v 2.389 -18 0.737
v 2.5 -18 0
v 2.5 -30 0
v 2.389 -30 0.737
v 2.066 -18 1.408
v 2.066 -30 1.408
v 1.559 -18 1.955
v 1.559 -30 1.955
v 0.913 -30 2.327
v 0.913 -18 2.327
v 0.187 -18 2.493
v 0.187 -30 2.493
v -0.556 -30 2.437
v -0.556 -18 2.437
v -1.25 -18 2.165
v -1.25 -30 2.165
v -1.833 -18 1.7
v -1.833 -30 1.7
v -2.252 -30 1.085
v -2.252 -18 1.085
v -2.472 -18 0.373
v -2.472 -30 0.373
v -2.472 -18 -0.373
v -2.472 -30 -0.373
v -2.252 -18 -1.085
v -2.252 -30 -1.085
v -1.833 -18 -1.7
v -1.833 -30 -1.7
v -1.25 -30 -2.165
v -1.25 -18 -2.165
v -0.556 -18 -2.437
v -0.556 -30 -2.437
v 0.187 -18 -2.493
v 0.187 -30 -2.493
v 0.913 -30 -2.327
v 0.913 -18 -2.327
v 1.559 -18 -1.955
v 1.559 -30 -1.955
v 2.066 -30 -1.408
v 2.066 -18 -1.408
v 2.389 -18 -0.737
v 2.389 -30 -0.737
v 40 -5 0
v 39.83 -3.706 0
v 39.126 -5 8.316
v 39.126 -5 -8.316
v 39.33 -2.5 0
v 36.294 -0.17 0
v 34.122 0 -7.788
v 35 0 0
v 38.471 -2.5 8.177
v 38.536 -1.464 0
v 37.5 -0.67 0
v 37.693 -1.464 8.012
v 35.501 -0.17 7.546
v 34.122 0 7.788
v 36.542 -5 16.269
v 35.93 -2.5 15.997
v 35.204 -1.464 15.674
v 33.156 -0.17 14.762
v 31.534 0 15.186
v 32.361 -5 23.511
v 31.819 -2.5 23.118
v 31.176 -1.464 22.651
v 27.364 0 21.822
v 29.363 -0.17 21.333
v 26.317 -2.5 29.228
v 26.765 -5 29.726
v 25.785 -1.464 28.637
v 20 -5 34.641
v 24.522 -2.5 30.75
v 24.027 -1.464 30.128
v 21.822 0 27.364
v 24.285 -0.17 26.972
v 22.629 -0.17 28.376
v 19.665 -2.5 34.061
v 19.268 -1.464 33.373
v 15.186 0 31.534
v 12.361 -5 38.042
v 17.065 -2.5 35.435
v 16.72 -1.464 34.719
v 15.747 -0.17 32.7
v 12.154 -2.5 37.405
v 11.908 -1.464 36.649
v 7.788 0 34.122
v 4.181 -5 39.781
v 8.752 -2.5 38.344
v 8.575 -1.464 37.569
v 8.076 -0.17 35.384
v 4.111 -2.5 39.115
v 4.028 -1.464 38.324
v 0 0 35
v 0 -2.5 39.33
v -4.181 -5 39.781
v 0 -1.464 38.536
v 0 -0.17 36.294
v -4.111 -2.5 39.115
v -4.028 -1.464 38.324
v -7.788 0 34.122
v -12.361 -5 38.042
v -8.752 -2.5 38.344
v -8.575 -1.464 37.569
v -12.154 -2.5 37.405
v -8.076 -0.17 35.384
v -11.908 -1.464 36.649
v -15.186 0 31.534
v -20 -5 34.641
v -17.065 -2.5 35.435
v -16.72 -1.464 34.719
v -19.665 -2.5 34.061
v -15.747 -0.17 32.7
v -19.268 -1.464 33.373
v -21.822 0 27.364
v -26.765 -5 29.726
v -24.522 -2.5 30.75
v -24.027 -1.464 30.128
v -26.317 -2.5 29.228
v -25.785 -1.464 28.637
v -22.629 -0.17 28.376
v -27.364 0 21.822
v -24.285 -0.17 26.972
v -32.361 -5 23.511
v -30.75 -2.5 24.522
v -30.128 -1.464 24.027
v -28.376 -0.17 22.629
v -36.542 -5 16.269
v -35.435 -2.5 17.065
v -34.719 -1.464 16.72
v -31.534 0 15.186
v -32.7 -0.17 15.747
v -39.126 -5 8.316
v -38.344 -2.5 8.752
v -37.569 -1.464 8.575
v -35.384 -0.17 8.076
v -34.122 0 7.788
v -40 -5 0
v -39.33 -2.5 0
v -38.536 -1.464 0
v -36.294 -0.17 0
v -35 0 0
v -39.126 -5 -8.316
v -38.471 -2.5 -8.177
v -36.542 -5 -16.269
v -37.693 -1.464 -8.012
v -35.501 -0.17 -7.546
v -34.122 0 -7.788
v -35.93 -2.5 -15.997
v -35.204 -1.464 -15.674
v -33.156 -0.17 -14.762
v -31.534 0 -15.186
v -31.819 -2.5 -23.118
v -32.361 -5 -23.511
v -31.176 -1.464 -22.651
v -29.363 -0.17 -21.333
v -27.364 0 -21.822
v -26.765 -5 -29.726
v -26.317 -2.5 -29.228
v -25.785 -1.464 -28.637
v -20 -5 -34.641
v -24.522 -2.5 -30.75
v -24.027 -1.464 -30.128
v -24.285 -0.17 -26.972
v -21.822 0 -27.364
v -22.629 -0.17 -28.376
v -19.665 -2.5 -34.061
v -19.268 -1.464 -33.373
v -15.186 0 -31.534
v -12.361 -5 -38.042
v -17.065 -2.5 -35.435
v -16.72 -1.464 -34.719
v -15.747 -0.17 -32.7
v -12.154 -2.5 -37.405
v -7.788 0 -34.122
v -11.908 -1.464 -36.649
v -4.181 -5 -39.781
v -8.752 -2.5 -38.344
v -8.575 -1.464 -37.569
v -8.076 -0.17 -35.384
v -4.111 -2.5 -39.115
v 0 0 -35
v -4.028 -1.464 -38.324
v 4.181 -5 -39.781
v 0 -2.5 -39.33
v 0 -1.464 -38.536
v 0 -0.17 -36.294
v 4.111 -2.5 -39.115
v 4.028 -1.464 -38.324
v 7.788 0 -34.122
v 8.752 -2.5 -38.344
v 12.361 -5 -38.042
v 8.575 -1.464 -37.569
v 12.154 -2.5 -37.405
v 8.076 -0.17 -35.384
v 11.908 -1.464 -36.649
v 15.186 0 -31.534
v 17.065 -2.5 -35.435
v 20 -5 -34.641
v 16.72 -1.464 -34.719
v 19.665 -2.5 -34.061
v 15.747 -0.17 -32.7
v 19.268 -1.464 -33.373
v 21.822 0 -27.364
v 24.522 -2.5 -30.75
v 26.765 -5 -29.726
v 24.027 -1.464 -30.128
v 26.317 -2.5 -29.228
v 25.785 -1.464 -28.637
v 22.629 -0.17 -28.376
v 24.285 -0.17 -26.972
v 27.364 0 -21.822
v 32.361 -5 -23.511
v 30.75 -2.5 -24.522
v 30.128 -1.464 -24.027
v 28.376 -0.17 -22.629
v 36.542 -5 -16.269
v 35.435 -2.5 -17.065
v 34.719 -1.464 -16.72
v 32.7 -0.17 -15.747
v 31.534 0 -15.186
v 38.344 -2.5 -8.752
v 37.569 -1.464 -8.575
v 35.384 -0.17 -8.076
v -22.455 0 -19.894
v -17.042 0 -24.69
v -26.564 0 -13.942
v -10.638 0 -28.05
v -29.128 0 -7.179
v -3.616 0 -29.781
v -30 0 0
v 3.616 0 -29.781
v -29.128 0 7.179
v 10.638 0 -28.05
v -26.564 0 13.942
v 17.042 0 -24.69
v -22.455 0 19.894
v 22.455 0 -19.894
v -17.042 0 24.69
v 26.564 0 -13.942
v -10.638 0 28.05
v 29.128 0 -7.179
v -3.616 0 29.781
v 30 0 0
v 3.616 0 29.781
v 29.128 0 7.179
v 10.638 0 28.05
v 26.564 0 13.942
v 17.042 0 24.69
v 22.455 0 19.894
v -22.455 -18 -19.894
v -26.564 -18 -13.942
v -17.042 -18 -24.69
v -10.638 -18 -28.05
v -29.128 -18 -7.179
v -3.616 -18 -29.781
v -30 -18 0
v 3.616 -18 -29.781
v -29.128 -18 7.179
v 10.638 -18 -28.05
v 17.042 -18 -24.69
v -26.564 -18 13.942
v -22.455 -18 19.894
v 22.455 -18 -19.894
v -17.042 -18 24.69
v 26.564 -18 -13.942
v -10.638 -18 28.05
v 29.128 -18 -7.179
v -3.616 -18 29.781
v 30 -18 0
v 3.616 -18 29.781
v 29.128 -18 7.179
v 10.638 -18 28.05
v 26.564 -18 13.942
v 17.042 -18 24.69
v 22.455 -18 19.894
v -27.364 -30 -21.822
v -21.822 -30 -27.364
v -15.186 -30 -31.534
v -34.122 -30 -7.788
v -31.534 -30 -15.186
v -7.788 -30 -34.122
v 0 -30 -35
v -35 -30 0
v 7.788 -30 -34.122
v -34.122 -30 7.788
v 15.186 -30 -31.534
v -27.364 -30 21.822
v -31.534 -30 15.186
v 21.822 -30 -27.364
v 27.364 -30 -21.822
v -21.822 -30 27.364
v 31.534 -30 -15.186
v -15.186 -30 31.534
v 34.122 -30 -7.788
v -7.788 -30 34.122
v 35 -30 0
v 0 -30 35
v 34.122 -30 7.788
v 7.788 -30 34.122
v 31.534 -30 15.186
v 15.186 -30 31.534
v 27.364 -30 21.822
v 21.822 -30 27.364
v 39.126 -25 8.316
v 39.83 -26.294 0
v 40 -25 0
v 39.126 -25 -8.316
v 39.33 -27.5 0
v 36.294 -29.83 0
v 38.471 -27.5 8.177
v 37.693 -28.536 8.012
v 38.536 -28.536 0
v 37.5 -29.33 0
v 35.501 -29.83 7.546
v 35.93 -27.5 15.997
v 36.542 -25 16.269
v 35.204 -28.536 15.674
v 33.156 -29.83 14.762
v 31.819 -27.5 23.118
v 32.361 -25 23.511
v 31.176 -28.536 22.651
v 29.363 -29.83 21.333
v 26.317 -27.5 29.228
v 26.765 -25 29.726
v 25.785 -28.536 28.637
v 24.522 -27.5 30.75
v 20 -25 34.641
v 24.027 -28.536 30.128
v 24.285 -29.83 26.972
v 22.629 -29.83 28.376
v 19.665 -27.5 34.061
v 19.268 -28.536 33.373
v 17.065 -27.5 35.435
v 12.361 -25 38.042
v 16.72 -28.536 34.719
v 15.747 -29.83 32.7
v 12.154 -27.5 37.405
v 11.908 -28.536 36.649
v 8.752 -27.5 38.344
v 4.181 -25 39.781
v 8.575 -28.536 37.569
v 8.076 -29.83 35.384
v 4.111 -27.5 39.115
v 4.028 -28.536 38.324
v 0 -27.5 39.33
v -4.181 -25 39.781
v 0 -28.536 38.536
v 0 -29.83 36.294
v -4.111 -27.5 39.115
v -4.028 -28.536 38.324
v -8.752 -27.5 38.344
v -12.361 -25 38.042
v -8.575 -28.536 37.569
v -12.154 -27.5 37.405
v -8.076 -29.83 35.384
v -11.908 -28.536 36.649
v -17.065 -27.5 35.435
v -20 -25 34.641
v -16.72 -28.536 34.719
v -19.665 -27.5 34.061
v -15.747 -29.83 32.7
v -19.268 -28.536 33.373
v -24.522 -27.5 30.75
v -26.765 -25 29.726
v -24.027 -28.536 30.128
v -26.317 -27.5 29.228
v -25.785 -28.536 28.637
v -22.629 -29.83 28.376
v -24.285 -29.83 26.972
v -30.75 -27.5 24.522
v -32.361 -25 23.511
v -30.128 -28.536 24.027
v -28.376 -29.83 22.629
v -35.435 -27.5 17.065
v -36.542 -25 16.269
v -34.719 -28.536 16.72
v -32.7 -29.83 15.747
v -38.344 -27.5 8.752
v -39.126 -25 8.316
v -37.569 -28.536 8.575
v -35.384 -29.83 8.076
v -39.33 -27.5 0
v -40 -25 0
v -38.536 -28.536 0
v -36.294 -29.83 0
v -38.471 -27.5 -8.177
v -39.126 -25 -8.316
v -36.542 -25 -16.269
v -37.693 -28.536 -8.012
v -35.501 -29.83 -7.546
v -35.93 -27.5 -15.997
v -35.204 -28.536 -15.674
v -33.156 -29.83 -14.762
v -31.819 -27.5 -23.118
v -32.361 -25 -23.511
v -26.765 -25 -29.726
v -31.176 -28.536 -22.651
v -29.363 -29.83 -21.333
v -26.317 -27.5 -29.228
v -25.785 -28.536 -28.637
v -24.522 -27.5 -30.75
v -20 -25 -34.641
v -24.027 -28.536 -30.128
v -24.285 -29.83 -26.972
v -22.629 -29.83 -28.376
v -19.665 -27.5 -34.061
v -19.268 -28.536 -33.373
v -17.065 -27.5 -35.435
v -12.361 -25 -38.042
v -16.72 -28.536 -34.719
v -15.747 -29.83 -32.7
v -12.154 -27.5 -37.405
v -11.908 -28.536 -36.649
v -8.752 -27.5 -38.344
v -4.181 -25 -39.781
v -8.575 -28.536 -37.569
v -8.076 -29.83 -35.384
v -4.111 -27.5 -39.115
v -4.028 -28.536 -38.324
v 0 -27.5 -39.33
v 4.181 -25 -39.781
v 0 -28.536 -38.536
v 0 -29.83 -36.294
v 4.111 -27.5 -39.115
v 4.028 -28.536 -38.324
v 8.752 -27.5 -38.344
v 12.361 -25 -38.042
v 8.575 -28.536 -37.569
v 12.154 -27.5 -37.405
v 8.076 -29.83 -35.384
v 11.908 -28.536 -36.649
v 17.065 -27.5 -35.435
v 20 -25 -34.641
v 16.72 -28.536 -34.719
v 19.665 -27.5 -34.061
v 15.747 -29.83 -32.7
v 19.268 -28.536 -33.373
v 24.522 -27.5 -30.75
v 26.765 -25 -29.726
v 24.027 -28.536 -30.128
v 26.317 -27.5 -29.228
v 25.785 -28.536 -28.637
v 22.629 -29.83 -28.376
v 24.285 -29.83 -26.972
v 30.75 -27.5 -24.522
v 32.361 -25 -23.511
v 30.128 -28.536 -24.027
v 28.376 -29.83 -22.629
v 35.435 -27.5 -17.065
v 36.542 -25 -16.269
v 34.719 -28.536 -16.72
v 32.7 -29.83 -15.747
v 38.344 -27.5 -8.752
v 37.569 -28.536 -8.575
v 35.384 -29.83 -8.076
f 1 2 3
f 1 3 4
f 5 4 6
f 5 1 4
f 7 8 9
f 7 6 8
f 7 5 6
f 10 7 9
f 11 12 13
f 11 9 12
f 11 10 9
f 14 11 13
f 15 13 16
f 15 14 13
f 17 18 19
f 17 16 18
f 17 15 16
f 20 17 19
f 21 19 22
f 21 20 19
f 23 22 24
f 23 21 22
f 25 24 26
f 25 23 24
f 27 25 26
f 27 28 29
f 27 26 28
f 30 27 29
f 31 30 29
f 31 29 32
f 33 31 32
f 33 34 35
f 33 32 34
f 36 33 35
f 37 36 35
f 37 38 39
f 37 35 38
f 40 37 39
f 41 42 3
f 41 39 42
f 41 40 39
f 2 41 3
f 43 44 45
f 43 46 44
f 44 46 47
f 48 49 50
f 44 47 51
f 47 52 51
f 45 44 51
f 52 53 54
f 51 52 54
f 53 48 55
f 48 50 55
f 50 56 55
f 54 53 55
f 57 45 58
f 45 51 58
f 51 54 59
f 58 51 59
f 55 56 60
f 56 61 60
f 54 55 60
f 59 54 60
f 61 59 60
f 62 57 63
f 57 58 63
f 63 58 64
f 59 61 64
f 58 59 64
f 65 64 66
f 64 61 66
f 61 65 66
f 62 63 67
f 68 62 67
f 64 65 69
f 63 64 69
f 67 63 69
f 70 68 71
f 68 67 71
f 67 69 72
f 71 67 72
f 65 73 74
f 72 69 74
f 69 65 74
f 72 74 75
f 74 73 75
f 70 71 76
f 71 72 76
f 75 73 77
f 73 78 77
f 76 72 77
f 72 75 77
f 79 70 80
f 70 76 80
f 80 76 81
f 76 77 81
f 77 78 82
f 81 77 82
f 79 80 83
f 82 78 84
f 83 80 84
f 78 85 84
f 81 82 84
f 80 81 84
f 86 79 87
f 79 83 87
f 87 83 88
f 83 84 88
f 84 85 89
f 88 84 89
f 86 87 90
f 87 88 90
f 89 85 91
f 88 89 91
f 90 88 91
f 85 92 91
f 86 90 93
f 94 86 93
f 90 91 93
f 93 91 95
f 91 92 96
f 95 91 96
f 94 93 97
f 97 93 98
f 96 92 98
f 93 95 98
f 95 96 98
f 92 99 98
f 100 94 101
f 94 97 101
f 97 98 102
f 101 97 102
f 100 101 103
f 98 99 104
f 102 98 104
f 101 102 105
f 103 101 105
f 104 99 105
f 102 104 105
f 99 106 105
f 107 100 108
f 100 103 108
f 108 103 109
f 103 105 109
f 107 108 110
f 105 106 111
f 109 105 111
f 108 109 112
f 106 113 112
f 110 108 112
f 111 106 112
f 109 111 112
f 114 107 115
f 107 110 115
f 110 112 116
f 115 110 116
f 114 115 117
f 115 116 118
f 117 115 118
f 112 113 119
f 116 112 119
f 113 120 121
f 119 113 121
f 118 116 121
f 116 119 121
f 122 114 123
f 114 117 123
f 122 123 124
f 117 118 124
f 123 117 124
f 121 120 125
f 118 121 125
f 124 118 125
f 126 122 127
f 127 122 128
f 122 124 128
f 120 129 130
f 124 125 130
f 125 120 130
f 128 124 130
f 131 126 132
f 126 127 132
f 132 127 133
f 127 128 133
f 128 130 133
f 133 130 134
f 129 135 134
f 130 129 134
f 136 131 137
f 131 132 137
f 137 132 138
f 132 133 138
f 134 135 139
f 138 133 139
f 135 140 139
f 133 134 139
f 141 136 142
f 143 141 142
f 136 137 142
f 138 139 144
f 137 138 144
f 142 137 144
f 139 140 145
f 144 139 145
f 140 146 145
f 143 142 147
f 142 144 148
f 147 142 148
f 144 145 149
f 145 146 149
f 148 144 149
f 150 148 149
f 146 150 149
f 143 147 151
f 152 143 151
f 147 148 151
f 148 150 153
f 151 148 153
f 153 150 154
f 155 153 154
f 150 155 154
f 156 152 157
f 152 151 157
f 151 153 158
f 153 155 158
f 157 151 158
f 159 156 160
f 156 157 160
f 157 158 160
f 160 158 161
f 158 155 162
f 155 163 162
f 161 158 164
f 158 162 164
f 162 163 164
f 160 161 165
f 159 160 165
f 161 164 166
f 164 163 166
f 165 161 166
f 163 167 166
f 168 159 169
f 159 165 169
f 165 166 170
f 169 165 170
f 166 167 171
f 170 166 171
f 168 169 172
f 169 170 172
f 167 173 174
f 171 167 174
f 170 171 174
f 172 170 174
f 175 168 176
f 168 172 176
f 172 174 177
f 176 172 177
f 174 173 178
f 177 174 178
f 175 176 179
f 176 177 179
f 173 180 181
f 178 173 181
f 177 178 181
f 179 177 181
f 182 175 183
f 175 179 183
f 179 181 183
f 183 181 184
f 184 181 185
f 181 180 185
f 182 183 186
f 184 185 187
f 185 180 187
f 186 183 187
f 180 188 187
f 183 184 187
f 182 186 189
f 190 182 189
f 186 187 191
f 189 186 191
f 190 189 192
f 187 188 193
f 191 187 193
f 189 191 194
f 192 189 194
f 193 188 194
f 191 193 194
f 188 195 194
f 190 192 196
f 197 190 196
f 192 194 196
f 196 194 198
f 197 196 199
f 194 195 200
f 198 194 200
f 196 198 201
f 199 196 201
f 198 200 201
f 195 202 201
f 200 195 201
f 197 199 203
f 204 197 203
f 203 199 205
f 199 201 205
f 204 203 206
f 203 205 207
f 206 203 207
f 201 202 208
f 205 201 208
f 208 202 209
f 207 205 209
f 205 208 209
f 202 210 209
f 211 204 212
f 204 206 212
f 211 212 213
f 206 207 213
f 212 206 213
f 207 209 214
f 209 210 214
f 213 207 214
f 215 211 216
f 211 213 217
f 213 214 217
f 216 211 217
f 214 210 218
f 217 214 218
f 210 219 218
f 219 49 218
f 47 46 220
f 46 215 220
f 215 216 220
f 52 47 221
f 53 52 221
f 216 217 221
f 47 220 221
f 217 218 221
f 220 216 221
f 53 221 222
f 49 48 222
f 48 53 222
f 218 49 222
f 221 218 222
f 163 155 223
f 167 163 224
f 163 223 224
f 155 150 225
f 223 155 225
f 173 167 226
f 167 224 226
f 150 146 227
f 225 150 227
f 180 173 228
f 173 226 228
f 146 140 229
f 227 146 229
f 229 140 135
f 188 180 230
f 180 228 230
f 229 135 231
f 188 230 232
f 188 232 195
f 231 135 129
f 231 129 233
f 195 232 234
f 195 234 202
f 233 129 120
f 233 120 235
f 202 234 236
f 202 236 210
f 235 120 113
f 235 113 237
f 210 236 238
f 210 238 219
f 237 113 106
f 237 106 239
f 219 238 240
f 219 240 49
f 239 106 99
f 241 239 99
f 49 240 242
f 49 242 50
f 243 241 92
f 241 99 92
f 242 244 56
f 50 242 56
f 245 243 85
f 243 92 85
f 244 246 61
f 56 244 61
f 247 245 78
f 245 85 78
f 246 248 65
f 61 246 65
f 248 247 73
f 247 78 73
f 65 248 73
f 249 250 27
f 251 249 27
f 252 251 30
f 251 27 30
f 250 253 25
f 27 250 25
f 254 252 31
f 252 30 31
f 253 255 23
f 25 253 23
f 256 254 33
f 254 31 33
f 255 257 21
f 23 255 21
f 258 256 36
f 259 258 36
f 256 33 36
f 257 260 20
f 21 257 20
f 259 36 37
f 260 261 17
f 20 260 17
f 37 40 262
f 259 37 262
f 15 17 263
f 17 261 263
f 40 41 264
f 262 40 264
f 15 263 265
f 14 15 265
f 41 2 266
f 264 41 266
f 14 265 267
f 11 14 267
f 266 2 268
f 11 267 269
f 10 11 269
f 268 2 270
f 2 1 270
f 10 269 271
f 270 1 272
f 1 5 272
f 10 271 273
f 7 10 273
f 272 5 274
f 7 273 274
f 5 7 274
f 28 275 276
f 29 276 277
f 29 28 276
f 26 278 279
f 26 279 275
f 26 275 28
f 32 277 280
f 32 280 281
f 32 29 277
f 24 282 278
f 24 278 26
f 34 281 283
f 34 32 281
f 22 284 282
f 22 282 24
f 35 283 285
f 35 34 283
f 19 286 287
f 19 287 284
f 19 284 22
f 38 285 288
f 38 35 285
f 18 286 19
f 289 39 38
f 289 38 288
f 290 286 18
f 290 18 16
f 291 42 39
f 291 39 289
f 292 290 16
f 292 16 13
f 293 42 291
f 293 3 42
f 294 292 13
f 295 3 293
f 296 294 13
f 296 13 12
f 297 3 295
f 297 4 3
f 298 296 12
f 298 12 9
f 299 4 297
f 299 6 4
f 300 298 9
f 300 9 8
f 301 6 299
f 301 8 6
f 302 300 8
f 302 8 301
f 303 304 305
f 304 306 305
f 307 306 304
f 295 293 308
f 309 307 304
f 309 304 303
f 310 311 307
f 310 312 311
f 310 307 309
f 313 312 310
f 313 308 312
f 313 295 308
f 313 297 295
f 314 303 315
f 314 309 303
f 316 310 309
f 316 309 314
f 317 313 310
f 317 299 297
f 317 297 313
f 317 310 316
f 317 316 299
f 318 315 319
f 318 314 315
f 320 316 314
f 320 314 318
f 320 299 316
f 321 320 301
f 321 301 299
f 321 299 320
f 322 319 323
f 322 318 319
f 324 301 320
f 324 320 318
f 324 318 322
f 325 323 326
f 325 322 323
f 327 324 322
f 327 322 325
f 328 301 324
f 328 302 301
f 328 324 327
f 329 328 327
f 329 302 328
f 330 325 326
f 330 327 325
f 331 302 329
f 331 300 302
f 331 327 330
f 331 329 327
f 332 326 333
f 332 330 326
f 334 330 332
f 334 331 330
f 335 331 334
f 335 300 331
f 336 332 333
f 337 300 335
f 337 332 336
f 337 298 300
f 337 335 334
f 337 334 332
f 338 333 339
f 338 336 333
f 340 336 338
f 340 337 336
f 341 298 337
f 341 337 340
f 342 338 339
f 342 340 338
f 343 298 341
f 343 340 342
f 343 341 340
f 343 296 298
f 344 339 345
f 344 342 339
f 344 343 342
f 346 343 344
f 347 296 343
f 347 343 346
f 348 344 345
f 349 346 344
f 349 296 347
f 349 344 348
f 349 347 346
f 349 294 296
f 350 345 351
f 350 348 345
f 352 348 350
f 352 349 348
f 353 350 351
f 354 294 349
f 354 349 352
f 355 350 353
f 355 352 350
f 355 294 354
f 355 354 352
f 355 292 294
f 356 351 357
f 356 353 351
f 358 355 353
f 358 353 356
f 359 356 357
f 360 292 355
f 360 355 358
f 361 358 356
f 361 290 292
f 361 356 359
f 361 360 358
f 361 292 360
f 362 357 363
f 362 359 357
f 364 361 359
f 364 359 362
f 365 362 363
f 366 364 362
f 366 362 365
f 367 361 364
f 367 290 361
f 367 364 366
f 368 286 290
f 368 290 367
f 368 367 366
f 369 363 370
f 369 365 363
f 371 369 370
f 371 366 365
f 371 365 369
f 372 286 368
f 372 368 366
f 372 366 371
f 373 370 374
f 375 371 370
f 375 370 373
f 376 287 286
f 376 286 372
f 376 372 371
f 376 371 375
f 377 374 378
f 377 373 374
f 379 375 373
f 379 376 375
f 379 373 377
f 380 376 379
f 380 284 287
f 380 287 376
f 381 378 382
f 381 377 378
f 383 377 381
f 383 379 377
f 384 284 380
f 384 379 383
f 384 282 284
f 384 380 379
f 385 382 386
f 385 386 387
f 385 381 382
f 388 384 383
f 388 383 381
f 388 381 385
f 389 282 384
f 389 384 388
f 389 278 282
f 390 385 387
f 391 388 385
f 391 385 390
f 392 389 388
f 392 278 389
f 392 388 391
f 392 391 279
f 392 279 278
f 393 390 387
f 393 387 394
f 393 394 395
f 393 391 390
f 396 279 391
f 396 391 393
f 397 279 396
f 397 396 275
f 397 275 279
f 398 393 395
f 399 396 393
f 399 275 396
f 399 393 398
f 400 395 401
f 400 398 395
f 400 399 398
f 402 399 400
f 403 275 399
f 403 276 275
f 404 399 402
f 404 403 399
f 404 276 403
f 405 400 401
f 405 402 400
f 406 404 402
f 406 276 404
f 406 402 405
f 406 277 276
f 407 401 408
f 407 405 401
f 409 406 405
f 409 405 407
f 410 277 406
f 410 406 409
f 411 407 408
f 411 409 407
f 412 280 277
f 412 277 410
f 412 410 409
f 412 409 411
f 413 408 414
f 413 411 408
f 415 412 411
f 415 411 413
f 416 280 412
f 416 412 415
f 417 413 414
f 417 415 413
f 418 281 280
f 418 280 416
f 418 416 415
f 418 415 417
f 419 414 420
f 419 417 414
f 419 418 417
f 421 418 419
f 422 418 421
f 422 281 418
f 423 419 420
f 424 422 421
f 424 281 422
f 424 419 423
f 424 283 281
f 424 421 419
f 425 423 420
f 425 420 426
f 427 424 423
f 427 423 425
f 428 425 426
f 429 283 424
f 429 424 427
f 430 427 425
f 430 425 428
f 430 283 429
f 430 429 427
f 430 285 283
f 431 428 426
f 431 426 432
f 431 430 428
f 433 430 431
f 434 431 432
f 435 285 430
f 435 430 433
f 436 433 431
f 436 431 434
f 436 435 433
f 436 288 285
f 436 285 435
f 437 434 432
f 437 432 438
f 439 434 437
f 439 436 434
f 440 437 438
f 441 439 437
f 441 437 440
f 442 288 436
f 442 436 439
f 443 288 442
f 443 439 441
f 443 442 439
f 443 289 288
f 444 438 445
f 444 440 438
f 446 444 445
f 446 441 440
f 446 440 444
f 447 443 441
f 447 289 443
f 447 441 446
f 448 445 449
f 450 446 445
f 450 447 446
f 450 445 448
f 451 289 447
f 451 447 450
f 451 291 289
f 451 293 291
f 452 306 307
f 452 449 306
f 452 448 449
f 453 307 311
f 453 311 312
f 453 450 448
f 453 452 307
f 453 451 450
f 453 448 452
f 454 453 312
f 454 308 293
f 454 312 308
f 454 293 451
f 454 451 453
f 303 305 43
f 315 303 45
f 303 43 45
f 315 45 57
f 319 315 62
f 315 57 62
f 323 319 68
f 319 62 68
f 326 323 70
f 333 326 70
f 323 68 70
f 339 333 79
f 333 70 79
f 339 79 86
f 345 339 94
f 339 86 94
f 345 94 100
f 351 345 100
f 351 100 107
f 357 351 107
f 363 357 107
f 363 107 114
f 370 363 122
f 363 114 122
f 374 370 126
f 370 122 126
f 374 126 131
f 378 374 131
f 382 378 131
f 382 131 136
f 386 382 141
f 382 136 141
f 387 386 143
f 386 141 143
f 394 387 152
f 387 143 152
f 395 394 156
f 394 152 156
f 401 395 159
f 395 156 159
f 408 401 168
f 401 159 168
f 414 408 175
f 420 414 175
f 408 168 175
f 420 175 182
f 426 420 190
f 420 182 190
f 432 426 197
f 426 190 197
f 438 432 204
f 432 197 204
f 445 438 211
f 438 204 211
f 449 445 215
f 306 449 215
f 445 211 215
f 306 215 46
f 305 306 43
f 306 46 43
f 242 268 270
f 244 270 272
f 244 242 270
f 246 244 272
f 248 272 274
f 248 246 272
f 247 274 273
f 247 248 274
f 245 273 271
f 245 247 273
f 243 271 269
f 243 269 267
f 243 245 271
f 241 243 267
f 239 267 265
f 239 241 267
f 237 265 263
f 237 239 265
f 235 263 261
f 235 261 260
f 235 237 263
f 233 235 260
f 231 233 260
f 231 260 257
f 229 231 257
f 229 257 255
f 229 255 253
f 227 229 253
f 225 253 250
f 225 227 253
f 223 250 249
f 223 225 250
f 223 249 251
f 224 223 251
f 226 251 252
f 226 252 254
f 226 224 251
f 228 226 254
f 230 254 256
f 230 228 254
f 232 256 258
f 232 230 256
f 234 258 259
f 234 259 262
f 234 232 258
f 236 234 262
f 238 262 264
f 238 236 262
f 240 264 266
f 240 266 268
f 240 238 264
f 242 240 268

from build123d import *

# Parameters (mm, degrees)
F0_R     = 40
F1_DEPTH = 30
F2_R     = 5
F3_R     = 30
F4_DEPTH = 18
F5_R     = 2.5
F6_DEPTH = 41.9


with BuildPart() as f1:
    # F0 (on Front) → F1 (new body)
    with BuildSketch(Plane.XZ):
        Circle(F0_R)
    extrude(amount=F1_DEPTH)

    # F2
    f2_edges = [f1.edges().sort_by_distance(p)[0] for p in [
        (40, -15, 0),
        (-40, 0, 0),
        (-40, -30, 0),
    ]]
    fillet(f2_edges, radius=F2_R)

    # F3 (on Front) → F4 (cut)
    with BuildSketch(Plane.XZ):
        Circle(F3_R)
    extrude(amount=F4_DEPTH, mode=Mode.SUBTRACT)

    # F5 (on Front) → F6 (cut)
    with BuildSketch(Plane.XZ):
        Circle(F5_R)
    extrude(amount=F6_DEPTH, mode=Mode.SUBTRACT)


solid = f1.part
